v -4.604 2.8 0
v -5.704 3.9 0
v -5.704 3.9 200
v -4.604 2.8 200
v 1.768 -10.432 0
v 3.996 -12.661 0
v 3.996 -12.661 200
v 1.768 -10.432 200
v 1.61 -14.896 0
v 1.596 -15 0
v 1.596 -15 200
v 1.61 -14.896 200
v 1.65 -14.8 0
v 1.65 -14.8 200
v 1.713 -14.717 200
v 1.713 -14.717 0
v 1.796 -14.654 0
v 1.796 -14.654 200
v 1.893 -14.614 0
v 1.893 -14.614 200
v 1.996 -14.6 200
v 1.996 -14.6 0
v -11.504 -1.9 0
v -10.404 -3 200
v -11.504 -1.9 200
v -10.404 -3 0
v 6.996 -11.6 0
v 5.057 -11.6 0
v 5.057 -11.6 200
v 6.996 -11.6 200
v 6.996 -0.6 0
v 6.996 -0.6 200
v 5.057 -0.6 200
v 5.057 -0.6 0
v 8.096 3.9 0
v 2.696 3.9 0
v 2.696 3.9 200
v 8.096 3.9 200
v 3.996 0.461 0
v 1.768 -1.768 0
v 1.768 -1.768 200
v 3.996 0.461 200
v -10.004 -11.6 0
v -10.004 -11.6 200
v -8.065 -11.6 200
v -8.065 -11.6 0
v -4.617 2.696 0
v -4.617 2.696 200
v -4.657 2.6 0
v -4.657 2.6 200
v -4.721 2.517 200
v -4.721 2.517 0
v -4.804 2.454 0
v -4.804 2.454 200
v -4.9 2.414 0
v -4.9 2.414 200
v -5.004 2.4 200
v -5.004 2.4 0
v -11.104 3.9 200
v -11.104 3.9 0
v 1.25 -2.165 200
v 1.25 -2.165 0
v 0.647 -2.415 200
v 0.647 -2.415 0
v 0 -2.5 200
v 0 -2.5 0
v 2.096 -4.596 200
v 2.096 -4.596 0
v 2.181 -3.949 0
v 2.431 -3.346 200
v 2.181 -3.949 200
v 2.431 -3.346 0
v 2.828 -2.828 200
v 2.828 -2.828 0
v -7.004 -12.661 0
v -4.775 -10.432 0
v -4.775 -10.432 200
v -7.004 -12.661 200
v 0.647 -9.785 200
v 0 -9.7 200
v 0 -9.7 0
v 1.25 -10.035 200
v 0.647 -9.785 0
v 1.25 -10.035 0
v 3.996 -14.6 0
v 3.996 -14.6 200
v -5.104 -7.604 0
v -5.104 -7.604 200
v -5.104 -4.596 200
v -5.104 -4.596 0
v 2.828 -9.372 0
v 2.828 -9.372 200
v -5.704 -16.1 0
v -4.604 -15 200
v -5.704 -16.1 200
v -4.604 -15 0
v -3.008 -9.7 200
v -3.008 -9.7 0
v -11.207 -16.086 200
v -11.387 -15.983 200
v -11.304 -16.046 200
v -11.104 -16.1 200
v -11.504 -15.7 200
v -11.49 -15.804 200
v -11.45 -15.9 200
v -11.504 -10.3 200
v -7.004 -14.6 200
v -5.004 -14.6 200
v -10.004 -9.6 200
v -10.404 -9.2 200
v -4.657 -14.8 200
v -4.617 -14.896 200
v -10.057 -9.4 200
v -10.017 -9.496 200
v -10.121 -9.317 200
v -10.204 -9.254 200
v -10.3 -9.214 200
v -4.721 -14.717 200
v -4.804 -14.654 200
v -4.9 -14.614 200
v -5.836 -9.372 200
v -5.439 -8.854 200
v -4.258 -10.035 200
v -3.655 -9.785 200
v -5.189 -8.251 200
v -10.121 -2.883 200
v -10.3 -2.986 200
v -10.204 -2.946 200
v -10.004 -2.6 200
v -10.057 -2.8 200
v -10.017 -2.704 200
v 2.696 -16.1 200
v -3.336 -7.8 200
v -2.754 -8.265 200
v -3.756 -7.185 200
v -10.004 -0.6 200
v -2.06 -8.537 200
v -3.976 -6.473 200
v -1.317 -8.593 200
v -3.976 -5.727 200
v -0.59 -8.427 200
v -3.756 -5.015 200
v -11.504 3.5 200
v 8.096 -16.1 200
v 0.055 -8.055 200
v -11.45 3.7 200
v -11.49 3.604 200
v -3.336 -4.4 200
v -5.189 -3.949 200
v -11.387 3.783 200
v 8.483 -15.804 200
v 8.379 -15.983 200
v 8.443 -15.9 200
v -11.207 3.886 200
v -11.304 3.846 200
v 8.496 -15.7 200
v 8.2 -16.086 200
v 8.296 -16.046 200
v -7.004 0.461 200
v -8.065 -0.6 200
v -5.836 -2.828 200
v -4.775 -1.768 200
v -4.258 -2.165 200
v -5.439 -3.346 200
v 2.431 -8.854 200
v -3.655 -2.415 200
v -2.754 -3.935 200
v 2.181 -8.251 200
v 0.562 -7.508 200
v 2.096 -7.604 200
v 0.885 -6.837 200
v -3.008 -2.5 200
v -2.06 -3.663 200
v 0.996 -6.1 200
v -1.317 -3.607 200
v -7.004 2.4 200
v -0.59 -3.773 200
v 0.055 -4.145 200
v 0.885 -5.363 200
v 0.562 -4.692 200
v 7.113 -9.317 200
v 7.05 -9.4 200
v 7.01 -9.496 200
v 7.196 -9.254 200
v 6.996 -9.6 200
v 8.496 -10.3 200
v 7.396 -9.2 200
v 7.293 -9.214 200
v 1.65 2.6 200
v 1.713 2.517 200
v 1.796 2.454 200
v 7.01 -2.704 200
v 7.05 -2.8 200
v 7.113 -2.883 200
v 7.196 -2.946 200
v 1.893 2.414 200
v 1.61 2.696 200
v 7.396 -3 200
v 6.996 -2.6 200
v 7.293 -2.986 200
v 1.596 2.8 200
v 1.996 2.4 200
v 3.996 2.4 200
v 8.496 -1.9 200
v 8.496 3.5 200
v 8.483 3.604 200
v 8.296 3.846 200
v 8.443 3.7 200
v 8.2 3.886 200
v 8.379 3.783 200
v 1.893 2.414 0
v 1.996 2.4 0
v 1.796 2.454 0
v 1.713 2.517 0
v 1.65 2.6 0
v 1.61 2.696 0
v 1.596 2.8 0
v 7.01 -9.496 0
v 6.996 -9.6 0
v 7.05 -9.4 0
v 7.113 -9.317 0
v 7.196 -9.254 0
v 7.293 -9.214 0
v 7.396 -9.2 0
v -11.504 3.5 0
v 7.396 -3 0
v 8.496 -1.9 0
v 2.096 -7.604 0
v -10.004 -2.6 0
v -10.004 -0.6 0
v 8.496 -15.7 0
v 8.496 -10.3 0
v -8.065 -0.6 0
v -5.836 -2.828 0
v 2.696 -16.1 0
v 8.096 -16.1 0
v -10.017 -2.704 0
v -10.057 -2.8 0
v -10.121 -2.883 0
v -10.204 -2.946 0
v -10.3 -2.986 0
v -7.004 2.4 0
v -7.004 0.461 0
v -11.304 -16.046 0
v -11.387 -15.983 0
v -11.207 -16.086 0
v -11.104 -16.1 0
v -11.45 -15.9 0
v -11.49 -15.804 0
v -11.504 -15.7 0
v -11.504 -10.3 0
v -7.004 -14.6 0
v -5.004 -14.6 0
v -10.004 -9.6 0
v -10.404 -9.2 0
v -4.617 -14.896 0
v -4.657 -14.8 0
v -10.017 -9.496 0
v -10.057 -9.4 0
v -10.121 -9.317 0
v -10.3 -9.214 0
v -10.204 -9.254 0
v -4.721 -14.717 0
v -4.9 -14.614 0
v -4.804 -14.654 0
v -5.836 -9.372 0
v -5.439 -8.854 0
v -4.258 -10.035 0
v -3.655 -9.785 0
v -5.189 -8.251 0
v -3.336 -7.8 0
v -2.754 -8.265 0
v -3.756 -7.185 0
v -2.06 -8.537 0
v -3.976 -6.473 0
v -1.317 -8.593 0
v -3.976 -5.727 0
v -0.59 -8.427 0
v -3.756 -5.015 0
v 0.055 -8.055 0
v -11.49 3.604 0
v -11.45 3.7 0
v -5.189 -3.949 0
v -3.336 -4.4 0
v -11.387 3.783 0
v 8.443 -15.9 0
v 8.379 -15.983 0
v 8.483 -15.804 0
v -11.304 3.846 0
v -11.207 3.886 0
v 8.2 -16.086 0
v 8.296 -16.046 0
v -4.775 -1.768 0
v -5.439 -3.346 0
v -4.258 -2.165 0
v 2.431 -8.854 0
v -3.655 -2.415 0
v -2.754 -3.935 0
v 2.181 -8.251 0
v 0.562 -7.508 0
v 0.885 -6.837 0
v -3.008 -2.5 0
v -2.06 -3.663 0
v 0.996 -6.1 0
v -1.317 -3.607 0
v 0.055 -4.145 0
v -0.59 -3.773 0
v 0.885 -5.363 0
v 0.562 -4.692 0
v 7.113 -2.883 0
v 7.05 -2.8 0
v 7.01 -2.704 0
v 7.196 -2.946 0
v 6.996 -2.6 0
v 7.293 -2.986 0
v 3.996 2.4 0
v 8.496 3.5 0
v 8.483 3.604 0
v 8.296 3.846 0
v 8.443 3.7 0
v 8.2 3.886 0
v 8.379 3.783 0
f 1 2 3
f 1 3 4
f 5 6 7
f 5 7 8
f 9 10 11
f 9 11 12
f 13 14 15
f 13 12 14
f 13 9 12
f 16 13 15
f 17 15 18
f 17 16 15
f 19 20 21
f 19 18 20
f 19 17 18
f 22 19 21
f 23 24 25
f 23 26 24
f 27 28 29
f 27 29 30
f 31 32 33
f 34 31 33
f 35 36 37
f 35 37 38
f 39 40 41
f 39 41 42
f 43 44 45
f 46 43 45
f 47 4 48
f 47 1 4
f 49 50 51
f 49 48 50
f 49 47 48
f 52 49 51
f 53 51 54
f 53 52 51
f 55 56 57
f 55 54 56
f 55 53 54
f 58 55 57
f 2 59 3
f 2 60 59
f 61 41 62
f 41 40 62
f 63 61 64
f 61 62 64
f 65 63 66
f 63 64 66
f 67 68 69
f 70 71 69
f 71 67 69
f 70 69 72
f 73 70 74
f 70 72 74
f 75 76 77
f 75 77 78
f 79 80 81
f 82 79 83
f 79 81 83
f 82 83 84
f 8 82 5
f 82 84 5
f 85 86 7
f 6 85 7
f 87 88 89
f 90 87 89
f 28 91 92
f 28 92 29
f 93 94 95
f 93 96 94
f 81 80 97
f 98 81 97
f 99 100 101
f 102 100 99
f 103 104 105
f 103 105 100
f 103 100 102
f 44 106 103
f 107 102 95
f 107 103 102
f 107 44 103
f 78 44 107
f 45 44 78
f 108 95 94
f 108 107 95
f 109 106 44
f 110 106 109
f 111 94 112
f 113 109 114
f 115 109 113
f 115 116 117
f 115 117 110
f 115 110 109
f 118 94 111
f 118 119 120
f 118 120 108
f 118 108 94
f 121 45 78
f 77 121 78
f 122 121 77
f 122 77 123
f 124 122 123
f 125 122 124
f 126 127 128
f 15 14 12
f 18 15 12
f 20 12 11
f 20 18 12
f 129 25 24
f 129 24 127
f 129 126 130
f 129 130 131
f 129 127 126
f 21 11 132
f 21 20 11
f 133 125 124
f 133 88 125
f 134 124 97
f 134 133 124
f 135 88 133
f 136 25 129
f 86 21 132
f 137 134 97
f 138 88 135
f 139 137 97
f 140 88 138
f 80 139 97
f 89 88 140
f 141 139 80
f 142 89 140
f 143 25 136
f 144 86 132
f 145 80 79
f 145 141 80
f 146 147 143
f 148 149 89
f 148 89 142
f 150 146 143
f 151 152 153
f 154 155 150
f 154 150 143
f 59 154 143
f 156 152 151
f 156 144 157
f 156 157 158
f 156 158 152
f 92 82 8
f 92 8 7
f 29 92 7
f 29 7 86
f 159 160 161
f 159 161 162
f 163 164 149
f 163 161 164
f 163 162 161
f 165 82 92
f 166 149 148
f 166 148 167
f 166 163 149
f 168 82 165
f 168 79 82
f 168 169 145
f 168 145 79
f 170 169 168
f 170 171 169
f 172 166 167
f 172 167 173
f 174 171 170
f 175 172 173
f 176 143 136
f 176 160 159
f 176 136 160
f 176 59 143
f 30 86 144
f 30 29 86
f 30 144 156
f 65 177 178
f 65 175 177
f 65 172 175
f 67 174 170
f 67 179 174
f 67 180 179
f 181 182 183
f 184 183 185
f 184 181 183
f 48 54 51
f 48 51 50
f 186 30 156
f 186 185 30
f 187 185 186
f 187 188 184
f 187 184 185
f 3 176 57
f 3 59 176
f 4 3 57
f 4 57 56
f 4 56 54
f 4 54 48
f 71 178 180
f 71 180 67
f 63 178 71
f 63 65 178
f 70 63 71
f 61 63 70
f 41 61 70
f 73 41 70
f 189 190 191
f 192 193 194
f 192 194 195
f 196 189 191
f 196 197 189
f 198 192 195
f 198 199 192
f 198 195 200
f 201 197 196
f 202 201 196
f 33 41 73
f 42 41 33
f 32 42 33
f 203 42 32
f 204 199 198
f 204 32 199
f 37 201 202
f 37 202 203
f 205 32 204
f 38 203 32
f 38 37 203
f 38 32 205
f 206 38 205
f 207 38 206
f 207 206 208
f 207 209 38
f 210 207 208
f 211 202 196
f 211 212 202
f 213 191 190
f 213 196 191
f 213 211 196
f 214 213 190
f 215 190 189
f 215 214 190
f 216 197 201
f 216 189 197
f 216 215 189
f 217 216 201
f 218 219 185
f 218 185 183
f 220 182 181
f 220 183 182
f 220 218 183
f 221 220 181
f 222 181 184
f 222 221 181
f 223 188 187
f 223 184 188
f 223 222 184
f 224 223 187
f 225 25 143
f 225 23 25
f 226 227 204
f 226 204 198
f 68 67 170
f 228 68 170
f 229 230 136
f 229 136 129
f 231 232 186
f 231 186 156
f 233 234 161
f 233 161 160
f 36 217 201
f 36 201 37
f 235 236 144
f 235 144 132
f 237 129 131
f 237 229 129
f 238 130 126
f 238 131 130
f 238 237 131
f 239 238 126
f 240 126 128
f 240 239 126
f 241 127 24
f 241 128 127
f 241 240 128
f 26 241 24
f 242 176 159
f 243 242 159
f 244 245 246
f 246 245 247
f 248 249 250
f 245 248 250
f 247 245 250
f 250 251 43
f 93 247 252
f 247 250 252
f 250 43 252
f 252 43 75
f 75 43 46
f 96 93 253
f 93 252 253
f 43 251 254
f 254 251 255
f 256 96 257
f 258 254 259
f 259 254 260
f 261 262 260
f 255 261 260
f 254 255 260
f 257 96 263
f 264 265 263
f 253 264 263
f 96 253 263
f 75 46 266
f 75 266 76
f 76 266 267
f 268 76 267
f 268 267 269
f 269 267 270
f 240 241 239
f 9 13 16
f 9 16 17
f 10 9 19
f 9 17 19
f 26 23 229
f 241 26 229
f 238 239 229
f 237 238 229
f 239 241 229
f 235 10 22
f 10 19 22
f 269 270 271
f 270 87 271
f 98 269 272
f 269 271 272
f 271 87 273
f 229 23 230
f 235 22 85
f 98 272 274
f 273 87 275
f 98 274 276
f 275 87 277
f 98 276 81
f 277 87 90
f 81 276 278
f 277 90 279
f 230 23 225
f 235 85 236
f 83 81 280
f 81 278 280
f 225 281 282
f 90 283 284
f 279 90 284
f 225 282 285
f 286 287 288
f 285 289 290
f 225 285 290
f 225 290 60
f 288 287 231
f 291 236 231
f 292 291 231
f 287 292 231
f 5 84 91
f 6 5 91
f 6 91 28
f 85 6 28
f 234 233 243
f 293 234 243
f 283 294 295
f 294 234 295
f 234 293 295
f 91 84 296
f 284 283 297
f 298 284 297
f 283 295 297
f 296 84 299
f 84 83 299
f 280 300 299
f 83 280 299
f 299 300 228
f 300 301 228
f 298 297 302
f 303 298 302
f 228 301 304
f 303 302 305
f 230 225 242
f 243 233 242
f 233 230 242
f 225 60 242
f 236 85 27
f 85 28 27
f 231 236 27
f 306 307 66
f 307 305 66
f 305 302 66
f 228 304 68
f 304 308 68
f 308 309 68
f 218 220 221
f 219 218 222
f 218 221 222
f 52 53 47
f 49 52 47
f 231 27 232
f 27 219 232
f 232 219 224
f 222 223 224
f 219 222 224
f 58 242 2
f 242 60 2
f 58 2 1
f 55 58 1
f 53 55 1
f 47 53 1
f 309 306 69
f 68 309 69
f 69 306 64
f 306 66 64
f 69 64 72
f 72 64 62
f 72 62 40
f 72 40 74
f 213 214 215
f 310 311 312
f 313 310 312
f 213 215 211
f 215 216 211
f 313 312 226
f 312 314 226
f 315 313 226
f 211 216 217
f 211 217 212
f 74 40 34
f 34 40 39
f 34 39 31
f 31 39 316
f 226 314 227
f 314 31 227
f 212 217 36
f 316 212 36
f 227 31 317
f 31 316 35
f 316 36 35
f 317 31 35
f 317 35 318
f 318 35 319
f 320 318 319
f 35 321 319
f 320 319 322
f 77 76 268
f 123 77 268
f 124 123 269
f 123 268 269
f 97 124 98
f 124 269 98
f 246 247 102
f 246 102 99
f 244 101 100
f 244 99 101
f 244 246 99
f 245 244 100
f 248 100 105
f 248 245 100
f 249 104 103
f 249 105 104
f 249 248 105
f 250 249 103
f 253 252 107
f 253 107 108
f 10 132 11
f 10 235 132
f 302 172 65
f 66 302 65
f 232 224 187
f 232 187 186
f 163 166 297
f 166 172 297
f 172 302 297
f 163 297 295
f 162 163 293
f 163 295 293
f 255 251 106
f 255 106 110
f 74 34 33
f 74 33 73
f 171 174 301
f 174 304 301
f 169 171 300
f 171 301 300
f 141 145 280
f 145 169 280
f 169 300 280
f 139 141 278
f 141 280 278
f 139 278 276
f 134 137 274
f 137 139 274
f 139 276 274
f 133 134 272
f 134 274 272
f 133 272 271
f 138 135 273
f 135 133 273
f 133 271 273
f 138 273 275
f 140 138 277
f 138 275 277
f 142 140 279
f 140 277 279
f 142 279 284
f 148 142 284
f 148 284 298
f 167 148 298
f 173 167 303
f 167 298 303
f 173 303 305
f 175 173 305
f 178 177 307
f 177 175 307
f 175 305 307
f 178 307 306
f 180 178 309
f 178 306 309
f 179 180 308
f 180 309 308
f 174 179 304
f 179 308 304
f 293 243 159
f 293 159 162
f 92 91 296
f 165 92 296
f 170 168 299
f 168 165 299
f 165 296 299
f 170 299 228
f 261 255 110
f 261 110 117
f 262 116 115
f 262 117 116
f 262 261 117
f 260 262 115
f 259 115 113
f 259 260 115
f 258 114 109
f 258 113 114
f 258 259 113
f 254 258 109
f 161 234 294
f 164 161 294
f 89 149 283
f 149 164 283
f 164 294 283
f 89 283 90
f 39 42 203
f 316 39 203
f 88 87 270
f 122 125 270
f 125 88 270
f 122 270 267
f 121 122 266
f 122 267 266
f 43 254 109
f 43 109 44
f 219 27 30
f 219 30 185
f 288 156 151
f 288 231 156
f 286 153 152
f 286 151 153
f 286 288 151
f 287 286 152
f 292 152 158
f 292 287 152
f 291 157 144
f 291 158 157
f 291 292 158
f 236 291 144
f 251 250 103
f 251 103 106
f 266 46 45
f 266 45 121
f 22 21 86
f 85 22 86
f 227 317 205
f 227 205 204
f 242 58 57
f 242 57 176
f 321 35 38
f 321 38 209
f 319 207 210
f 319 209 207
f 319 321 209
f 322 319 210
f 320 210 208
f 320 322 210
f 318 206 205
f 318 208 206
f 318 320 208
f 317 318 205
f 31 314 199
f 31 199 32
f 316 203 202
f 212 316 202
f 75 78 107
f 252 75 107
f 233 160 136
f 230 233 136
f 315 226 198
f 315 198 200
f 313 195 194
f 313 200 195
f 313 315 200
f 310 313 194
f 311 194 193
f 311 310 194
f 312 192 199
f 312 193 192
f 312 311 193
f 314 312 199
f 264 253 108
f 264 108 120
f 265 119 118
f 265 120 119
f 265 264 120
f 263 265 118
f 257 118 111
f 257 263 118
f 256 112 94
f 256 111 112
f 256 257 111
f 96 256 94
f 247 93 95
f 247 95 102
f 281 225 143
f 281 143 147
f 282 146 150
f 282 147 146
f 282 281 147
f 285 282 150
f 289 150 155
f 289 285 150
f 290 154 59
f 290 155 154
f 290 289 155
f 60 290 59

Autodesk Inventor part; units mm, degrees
ref_plane "YZ Plane" through (0, 0, 0) normal (1, 0, 0) x (0, 1, 0)
ref_plane "XZ Plane" through (0, 0, 0) normal (0, 1, 0) x (-1, 0, 0)
ref_plane "XY Plane" through (0, 0, 0) normal (0, 0, 1) x (1, 0, 0)
sketch "Sketch1" plane through (0, 0, 0) normal (0, 0, 1) x (1, 0, 0)
  line L0 (1.7678, -1.7678) -> (3.9962, 0.4607) projected
  arc A0 (0, -2.5) -> (1.7678, -1.7678) centre (0, 0) ccw projected
  line L1 (-3.0076, -2.5) -> (0, -2.5) projected
  arc A1 (-4.7754, -1.7678) -> (-3.0076, -2.5) centre (-3.0076, 0) ccw projected
  line L2 (-7.0038, 0.4607) -> (-4.7754, -1.7678) projected
  line L3 (-7.0038, 2.4) -> (-7.0038, 0.4607) projected
  line L4 (-5.0038, 2.4) -> (-7.0038, 2.4) projected
  arc A2 (-5.0038, 2.4) -> (-4.6038, 2.8) centre (-5.0038, 2.8) ccw projected
  line L5 (-5.7038, 3.9) -> (-4.6038, 2.8) projected
  line L6 (-11.1038, 3.9) -> (-5.7038, 3.9) projected
  arc A3 (-11.1038, 3.9) -> (-11.5038, 3.5) centre (-11.1038, 3.5) ccw projected
  line L7 (-11.5038, -1.9) -> (-11.5038, 3.5) projected
  line L8 (-10.4038, -3) -> (-11.5038, -1.9) projected
  arc A4 (-10.4038, -3) -> (-10.0038, -2.6) centre (-10.4038, -2.6) ccw projected
  line L9 (-10.0038, -0.6) -> (-10.0038, -2.6) projected
  line L10 (-8.0645, -0.6) -> (-10.0038, -0.6) projected
  line L11 (-5.836, -2.8284) -> (-8.0645, -0.6) projected
  arc A5 (-5.1038, -4.5962) -> (-5.836, -2.8284) centre (-7.6038, -4.5962) ccw projected
  line L12 (-5.1038, -7.6038) -> (-5.1038, -4.5962) projected
  arc A6 (-5.836, -9.3716) -> (-5.1038, -7.6038) centre (-7.6038, -7.6038) ccw projected
  line L13 (-8.0645, -11.6) -> (-5.836, -9.3716) projected
  line L14 (-10.0038, -11.6) -> (-8.0645, -11.6) projected
  line L15 (-10.0038, -9.6) -> (-10.0038, -11.6) projected
  arc A7 (-10.0038, -9.6) -> (-10.4038, -9.2) centre (-10.4038, -9.6) ccw projected
  line L16 (-11.5038, -10.3) -> (-10.4038, -9.2) projected
  line L17 (-11.5038, -15.7) -> (-11.5038, -10.3) projected
  arc A8 (-11.5038, -15.7) -> (-11.1038, -16.1) centre (-11.1038, -15.7) ccw projected
  line L18 (-5.7038, -16.1) -> (-11.1038, -16.1) projected
  line L19 (-4.6038, -15) -> (-5.7038, -16.1) projected
  arc A9 (-4.6038, -15) -> (-5.0038, -14.6) centre (-5.0038, -15) ccw projected
  line L20 (-7.0038, -14.6) -> (-5.0038, -14.6) projected
  line L21 (-7.0038, -12.6607) -> (-7.0038, -14.6) projected
  line L22 (-4.7754, -10.4322) -> (-7.0038, -12.6607) projected
  arc A10 (-3.0076, -9.7) -> (-4.7754, -10.4322) centre (-3.0076, -12.2) ccw projected
  line L23 (0, -9.7) -> (-3.0076, -9.7) projected
  arc A11 (1.7678, -10.4322) -> (0, -9.7) centre (0, -12.2) ccw projected
  line L24 (3.9962, -12.6607) -> (1.7678, -10.4322) projected
  line L25 (3.9962, -14.6) -> (3.9962, -12.6607) projected
  line L26 (1.9962, -14.6) -> (3.9962, -14.6) projected
  arc A12 (1.9962, -14.6) -> (1.5962, -15) centre (1.9962, -15) ccw projected
  line L27 (2.6962, -16.1) -> (1.5962, -15) projected
  line L28 (8.0962, -16.1) -> (2.6962, -16.1) projected
  arc A13 (8.0962, -16.1) -> (8.4962, -15.7) centre (8.0962, -15.7) ccw projected
  line L29 (8.4962, -10.3) -> (8.4962, -15.7) projected
  line L30 (7.3962, -9.2) -> (8.4962, -10.3) projected
  arc A14 (7.3962, -9.2) -> (6.9962, -9.6) centre (7.3962, -9.6) ccw projected
  line L31 (6.9962, -11.6) -> (6.9962, -9.6) projected
  line L32 (5.0569, -11.6) -> (6.9962, -11.6) projected
  line L33 (2.8284, -9.3716) -> (5.0569, -11.6) projected
  arc A15 (2.0962, -7.6038) -> (2.8284, -9.3716) centre (4.5962, -7.6038) ccw projected
  line L34 (2.0962, -4.5962) -> (2.0962, -7.6038) projected
  arc A16 (2.8284, -2.8284) -> (2.0962, -4.5962) centre (4.5962, -4.5962) ccw projected
  line L35 (5.0569, -0.6) -> (2.8284, -2.8284) projected
  line L36 (6.9962, -0.6) -> (5.0569, -0.6) projected
  line L37 (6.9962, -2.6) -> (6.9962, -0.6) projected
  arc A17 (6.9962, -2.6) -> (7.3962, -3) centre (7.3962, -2.6) ccw projected
  line L38 (8.4962, -1.9) -> (7.3962, -3) projected
  line L39 (8.4962, 3.5) -> (8.4962, -1.9) projected
  arc A18 (8.4962, 3.5) -> (8.0962, 3.9) centre (8.0962, 3.5) ccw projected
  line L40 (2.6962, 3.9) -> (8.0962, 3.9) projected
  line L41 (1.5962, 2.8) -> (2.6962, 3.9) projected
  arc A19 (1.5962, 2.8) -> (1.9962, 2.4) centre (1.9962, 2.8) ccw projected
  line L42 (3.9962, 2.4) -> (1.9962, 2.4) projected
  line L43 (3.9962, 0.4607) -> (3.9962, 2.4) projected
  circle A20 centre (-1.5038, -6.1) radius 2.5 projected
  point P0 (0, 0)
extrude "Extrusion1" add sketch "Sketch1" along normal blind 200
properties part number "00_VSlot_20mm"
